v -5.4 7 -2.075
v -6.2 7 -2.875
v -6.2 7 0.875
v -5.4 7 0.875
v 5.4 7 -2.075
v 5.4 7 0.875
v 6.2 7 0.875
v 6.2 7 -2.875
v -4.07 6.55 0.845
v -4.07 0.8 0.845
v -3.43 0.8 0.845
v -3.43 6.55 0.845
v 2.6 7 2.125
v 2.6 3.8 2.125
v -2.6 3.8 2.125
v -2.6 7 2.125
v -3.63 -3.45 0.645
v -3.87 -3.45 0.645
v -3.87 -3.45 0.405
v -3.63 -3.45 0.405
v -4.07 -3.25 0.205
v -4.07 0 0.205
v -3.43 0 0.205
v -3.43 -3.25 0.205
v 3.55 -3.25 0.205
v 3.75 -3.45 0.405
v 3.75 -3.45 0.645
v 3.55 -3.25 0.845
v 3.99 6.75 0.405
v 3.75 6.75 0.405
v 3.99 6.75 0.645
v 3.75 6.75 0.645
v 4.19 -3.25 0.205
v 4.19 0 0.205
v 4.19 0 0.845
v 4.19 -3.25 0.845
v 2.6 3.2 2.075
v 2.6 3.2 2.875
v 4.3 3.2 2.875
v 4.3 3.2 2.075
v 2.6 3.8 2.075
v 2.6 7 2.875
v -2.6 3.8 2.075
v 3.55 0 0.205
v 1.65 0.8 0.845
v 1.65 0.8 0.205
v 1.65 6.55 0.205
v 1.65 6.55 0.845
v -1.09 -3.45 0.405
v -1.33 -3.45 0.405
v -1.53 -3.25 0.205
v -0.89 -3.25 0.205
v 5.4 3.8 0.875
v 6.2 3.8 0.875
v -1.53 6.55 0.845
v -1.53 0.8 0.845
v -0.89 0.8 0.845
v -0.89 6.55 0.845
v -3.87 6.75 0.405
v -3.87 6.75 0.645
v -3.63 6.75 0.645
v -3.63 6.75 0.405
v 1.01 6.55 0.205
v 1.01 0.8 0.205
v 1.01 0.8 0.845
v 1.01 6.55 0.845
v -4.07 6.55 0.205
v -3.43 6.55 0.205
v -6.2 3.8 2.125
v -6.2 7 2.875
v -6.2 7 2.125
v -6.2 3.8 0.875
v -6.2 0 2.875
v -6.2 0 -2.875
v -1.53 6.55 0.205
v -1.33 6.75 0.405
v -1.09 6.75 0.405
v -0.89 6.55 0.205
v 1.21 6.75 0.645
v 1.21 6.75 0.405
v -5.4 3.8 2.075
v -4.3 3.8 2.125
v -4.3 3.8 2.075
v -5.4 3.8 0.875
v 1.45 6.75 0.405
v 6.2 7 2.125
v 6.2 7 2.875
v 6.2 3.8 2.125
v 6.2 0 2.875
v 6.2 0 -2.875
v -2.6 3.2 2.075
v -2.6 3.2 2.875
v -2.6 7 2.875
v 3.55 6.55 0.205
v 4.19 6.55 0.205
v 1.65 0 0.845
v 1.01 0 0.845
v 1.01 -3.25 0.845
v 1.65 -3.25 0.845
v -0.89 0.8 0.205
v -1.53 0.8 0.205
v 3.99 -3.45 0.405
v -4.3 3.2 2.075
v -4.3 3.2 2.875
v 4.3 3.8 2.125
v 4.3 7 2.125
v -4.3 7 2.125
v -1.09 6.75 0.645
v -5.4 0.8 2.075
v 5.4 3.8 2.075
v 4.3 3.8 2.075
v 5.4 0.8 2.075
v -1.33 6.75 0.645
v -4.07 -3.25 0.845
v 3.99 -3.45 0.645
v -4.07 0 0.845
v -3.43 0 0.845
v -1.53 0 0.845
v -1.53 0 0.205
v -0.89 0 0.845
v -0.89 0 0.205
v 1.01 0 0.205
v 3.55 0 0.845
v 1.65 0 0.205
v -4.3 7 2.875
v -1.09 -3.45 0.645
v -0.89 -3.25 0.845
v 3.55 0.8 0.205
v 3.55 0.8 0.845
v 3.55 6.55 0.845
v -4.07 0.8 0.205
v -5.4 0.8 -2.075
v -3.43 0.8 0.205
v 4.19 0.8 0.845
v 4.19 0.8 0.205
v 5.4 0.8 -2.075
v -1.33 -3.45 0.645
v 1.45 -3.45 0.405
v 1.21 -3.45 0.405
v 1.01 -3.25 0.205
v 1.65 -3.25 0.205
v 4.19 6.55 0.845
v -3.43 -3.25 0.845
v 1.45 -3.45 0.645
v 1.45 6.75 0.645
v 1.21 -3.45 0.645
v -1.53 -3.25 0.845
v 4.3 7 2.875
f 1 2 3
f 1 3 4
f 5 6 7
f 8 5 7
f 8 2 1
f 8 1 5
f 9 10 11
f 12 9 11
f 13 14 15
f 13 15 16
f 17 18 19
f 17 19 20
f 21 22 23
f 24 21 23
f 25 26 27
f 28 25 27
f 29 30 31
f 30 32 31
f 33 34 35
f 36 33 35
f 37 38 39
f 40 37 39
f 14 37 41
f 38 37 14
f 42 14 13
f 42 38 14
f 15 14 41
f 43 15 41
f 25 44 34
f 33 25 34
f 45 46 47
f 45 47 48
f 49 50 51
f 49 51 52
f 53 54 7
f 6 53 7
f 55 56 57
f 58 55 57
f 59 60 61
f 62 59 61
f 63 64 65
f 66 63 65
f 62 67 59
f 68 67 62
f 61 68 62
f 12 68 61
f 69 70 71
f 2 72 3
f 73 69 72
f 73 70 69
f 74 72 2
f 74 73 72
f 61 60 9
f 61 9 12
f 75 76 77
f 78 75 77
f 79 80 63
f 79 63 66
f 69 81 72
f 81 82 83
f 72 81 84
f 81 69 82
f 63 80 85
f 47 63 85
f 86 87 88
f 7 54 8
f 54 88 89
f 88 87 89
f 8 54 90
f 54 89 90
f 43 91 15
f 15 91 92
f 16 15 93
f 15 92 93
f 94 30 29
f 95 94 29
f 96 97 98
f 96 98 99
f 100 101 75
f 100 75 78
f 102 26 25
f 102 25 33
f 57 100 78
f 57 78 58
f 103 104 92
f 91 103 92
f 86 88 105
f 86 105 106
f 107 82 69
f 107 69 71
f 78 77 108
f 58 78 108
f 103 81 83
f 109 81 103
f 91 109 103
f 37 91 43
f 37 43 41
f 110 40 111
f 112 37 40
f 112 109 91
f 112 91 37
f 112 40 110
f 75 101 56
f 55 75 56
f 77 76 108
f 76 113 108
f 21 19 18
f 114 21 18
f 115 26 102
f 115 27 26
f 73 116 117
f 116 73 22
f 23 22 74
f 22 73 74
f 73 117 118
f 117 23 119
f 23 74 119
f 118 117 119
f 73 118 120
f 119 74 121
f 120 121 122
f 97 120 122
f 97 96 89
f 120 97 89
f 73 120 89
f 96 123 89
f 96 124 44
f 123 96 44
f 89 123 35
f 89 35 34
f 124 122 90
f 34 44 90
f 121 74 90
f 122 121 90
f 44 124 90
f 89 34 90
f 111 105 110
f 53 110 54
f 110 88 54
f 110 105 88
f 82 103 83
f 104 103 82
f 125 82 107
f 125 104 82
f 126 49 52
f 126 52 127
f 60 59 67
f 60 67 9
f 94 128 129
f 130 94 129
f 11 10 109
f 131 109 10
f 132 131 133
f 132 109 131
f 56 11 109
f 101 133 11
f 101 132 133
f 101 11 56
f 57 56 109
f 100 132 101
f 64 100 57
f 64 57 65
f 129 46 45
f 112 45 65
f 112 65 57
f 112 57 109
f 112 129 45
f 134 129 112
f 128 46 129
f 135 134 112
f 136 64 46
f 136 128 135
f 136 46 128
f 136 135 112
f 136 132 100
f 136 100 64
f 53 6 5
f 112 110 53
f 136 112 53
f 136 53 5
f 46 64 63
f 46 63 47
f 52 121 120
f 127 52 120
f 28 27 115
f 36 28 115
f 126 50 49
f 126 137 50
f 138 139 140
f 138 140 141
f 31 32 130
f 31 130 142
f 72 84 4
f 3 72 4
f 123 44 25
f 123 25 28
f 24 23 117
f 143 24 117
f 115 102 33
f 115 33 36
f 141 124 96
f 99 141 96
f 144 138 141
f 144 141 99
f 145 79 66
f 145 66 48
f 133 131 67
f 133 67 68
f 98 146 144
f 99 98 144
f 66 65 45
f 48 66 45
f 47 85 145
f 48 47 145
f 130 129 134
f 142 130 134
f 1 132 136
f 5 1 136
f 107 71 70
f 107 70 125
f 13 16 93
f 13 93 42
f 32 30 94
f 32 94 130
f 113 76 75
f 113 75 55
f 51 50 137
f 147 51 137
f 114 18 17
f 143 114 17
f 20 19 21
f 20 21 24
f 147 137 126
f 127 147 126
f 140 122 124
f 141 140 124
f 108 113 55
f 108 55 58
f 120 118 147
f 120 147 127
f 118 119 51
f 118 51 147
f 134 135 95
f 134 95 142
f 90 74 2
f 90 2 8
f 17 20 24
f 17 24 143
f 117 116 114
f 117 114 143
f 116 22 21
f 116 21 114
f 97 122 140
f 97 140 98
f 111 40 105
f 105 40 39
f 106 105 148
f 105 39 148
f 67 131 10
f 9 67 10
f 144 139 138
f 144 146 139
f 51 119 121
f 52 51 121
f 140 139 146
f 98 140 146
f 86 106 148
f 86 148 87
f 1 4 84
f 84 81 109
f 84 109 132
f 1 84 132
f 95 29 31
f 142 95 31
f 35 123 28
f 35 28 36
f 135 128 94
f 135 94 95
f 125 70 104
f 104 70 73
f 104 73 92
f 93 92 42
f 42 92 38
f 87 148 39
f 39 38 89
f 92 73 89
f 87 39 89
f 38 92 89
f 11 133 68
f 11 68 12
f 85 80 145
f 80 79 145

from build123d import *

# Parameters (mm, degrees)
SKETCH1_W                = 12.4
SKETCH1_H                = 5.75
BOSS_EXTRUDE1_DEPTH      = 7
SHELL1_T                 = -0.8
SKETCH2_W                = 1.25
SKETCH2_H                = 3.2
CUT_EXTRUDE1_DEPTH       = 13.4
CUT_EXTRUDE2_REACH       = 7.75
SKETCH3_W                = 1.7
SKETCH3_H                = 3.8
SKETCH4_W                = 0.64
SKETCH4_H                = 0.64
BOSS_EXTRUDE2_DEPTH      = 3.45
BOSS_EXTRUDE2_DEPTH_BACK = 6.75
CHAMFER1_SIZE            = 0.2


with BuildPart() as part:
    # Sketch1 → Boss-Extrude1 (new body)
    with BuildSketch(Plane(origin=(0, 0, 0), x_dir=(1, 0, 0), z_dir=(0, 1, 0))):
        Rectangle(SKETCH1_W, SKETCH1_H)
    extrude(amount=BOSS_EXTRUDE1_DEPTH)

    # Shell1
    shell1_openings = [part.faces().sort_by_distance(p)[0] for p in [
        (0, 7, 0),
    ]]
    offset(amount=SHELL1_T, openings=shell1_openings, kind=Kind.INTERSECTION)

    # Sketch2 → Cut-Extrude1 (cut, through all)
    with BuildSketch(Plane(origin=(6.2, 0, 0), x_dir=(0, 0, -1), z_dir=(1, 0, 0))):
        with Locations((-1.5, 5.4)):
            Rectangle(SKETCH2_W, SKETCH2_H)
    extrude(amount=-CUT_EXTRUDE1_DEPTH, mode=Mode.SUBTRACT)

    # Sketch3 → Cut-Extrude2 (cut, up to next)
    with BuildSketch(Plane.XY.offset(2.875), mode=Mode.PRIVATE) as cut_extrude2_sk1:
        with Locations((-3.45, 5.1)):
            Rectangle(SKETCH3_W, SKETCH3_H)
    cut_extrude2_tool1 = extrude(cut_extrude2_sk1.sketch, amount=-CUT_EXTRUDE2_REACH, mode=Mode.PRIVATE) & part.part
    add(cut_extrude2_tool1.solids().sort_by_distance((-3.45, 5.1, 2.875))[0], mode=Mode.SUBTRACT)
    # Sketch3 → Cut-Extrude2 (cut, up to next)
    with BuildSketch(Plane.XY.offset(2.875), mode=Mode.PRIVATE) as cut_extrude2_sk2:
        with Locations((3.45, 5.1)):
            Rectangle(SKETCH3_W, SKETCH3_H)
    cut_extrude2_tool2 = extrude(cut_extrude2_sk2.sketch, amount=-CUT_EXTRUDE2_REACH, mode=Mode.PRIVATE) & part.part
    add(cut_extrude2_tool2.solids().sort_by_distance((3.45, 5.1, 2.875))[0], mode=Mode.SUBTRACT)

    # Sketch4 → Boss-Extrude2 (add, two sides)
    with BuildSketch(Plane.XZ) as boss_extrude2_sk:
        with Locations((-3.75, 0.525)):
            Rectangle(SKETCH4_W, SKETCH4_H)
        with Locations((-1.21, 0.525)):
            Rectangle(SKETCH4_W, SKETCH4_H)
        with Locations((1.33, 0.525)):
            Rectangle(SKETCH4_W, SKETCH4_H)
        with Locations((3.87, 0.525)):
            Rectangle(SKETCH4_W, SKETCH4_H)
    extrude(amount=BOSS_EXTRUDE2_DEPTH)
    extrude(boss_extrude2_sk.sketch, amount=-BOSS_EXTRUDE2_DEPTH_BACK)

    # Chamfer1
    chamfer1_edges = [part.edges().sort_by_distance(p)[0] for p in [
        (-1.21, 6.75, 0.205),
        (-1.53, 6.75, 0.525),
        (-1.21, 6.75, 0.845),
        (-0.89, 6.75, 0.525),
        (-1.21, -3.45, 0.205),
        (-0.89, -3.45, 0.525),
        (-1.21, -3.45, 0.845),
        (-1.53, -3.45, 0.525),
        (1.33, 6.75, 0.205),
        (1.01, 6.75, 0.525),
        (1.33, 6.75, 0.845),
        (1.65, 6.75, 0.525),
        (1.33, -3.45, 0.205),
        (1.65, -3.45, 0.525),
        (1.33, -3.45, 0.845),
        (1.01, -3.45, 0.525),
        (3.87, 6.75, 0.205),
        (3.55, 6.75, 0.525),
        (3.87, 6.75, 0.845),
        (4.19, 6.75, 0.525),
        (3.87, -3.45, 0.205),
        (4.19, -3.45, 0.525),
        (3.87, -3.45, 0.845),
        (3.55, -3.45, 0.525),
        (-3.43, 6.75, 0.525),
        (-3.75, 6.75, 0.205),
        (-4.07, 6.75, 0.525),
        (-3.75, 6.75, 0.845),
        (-3.43, -3.45, 0.525),
        (-3.75, -3.45, 0.845),
        (-4.07, -3.45, 0.525),
        (-3.75, -3.45, 0.205),
    ]]
    chamfer(chamfer1_edges, length=CHAMFER1_SIZE)


solid = part.part
